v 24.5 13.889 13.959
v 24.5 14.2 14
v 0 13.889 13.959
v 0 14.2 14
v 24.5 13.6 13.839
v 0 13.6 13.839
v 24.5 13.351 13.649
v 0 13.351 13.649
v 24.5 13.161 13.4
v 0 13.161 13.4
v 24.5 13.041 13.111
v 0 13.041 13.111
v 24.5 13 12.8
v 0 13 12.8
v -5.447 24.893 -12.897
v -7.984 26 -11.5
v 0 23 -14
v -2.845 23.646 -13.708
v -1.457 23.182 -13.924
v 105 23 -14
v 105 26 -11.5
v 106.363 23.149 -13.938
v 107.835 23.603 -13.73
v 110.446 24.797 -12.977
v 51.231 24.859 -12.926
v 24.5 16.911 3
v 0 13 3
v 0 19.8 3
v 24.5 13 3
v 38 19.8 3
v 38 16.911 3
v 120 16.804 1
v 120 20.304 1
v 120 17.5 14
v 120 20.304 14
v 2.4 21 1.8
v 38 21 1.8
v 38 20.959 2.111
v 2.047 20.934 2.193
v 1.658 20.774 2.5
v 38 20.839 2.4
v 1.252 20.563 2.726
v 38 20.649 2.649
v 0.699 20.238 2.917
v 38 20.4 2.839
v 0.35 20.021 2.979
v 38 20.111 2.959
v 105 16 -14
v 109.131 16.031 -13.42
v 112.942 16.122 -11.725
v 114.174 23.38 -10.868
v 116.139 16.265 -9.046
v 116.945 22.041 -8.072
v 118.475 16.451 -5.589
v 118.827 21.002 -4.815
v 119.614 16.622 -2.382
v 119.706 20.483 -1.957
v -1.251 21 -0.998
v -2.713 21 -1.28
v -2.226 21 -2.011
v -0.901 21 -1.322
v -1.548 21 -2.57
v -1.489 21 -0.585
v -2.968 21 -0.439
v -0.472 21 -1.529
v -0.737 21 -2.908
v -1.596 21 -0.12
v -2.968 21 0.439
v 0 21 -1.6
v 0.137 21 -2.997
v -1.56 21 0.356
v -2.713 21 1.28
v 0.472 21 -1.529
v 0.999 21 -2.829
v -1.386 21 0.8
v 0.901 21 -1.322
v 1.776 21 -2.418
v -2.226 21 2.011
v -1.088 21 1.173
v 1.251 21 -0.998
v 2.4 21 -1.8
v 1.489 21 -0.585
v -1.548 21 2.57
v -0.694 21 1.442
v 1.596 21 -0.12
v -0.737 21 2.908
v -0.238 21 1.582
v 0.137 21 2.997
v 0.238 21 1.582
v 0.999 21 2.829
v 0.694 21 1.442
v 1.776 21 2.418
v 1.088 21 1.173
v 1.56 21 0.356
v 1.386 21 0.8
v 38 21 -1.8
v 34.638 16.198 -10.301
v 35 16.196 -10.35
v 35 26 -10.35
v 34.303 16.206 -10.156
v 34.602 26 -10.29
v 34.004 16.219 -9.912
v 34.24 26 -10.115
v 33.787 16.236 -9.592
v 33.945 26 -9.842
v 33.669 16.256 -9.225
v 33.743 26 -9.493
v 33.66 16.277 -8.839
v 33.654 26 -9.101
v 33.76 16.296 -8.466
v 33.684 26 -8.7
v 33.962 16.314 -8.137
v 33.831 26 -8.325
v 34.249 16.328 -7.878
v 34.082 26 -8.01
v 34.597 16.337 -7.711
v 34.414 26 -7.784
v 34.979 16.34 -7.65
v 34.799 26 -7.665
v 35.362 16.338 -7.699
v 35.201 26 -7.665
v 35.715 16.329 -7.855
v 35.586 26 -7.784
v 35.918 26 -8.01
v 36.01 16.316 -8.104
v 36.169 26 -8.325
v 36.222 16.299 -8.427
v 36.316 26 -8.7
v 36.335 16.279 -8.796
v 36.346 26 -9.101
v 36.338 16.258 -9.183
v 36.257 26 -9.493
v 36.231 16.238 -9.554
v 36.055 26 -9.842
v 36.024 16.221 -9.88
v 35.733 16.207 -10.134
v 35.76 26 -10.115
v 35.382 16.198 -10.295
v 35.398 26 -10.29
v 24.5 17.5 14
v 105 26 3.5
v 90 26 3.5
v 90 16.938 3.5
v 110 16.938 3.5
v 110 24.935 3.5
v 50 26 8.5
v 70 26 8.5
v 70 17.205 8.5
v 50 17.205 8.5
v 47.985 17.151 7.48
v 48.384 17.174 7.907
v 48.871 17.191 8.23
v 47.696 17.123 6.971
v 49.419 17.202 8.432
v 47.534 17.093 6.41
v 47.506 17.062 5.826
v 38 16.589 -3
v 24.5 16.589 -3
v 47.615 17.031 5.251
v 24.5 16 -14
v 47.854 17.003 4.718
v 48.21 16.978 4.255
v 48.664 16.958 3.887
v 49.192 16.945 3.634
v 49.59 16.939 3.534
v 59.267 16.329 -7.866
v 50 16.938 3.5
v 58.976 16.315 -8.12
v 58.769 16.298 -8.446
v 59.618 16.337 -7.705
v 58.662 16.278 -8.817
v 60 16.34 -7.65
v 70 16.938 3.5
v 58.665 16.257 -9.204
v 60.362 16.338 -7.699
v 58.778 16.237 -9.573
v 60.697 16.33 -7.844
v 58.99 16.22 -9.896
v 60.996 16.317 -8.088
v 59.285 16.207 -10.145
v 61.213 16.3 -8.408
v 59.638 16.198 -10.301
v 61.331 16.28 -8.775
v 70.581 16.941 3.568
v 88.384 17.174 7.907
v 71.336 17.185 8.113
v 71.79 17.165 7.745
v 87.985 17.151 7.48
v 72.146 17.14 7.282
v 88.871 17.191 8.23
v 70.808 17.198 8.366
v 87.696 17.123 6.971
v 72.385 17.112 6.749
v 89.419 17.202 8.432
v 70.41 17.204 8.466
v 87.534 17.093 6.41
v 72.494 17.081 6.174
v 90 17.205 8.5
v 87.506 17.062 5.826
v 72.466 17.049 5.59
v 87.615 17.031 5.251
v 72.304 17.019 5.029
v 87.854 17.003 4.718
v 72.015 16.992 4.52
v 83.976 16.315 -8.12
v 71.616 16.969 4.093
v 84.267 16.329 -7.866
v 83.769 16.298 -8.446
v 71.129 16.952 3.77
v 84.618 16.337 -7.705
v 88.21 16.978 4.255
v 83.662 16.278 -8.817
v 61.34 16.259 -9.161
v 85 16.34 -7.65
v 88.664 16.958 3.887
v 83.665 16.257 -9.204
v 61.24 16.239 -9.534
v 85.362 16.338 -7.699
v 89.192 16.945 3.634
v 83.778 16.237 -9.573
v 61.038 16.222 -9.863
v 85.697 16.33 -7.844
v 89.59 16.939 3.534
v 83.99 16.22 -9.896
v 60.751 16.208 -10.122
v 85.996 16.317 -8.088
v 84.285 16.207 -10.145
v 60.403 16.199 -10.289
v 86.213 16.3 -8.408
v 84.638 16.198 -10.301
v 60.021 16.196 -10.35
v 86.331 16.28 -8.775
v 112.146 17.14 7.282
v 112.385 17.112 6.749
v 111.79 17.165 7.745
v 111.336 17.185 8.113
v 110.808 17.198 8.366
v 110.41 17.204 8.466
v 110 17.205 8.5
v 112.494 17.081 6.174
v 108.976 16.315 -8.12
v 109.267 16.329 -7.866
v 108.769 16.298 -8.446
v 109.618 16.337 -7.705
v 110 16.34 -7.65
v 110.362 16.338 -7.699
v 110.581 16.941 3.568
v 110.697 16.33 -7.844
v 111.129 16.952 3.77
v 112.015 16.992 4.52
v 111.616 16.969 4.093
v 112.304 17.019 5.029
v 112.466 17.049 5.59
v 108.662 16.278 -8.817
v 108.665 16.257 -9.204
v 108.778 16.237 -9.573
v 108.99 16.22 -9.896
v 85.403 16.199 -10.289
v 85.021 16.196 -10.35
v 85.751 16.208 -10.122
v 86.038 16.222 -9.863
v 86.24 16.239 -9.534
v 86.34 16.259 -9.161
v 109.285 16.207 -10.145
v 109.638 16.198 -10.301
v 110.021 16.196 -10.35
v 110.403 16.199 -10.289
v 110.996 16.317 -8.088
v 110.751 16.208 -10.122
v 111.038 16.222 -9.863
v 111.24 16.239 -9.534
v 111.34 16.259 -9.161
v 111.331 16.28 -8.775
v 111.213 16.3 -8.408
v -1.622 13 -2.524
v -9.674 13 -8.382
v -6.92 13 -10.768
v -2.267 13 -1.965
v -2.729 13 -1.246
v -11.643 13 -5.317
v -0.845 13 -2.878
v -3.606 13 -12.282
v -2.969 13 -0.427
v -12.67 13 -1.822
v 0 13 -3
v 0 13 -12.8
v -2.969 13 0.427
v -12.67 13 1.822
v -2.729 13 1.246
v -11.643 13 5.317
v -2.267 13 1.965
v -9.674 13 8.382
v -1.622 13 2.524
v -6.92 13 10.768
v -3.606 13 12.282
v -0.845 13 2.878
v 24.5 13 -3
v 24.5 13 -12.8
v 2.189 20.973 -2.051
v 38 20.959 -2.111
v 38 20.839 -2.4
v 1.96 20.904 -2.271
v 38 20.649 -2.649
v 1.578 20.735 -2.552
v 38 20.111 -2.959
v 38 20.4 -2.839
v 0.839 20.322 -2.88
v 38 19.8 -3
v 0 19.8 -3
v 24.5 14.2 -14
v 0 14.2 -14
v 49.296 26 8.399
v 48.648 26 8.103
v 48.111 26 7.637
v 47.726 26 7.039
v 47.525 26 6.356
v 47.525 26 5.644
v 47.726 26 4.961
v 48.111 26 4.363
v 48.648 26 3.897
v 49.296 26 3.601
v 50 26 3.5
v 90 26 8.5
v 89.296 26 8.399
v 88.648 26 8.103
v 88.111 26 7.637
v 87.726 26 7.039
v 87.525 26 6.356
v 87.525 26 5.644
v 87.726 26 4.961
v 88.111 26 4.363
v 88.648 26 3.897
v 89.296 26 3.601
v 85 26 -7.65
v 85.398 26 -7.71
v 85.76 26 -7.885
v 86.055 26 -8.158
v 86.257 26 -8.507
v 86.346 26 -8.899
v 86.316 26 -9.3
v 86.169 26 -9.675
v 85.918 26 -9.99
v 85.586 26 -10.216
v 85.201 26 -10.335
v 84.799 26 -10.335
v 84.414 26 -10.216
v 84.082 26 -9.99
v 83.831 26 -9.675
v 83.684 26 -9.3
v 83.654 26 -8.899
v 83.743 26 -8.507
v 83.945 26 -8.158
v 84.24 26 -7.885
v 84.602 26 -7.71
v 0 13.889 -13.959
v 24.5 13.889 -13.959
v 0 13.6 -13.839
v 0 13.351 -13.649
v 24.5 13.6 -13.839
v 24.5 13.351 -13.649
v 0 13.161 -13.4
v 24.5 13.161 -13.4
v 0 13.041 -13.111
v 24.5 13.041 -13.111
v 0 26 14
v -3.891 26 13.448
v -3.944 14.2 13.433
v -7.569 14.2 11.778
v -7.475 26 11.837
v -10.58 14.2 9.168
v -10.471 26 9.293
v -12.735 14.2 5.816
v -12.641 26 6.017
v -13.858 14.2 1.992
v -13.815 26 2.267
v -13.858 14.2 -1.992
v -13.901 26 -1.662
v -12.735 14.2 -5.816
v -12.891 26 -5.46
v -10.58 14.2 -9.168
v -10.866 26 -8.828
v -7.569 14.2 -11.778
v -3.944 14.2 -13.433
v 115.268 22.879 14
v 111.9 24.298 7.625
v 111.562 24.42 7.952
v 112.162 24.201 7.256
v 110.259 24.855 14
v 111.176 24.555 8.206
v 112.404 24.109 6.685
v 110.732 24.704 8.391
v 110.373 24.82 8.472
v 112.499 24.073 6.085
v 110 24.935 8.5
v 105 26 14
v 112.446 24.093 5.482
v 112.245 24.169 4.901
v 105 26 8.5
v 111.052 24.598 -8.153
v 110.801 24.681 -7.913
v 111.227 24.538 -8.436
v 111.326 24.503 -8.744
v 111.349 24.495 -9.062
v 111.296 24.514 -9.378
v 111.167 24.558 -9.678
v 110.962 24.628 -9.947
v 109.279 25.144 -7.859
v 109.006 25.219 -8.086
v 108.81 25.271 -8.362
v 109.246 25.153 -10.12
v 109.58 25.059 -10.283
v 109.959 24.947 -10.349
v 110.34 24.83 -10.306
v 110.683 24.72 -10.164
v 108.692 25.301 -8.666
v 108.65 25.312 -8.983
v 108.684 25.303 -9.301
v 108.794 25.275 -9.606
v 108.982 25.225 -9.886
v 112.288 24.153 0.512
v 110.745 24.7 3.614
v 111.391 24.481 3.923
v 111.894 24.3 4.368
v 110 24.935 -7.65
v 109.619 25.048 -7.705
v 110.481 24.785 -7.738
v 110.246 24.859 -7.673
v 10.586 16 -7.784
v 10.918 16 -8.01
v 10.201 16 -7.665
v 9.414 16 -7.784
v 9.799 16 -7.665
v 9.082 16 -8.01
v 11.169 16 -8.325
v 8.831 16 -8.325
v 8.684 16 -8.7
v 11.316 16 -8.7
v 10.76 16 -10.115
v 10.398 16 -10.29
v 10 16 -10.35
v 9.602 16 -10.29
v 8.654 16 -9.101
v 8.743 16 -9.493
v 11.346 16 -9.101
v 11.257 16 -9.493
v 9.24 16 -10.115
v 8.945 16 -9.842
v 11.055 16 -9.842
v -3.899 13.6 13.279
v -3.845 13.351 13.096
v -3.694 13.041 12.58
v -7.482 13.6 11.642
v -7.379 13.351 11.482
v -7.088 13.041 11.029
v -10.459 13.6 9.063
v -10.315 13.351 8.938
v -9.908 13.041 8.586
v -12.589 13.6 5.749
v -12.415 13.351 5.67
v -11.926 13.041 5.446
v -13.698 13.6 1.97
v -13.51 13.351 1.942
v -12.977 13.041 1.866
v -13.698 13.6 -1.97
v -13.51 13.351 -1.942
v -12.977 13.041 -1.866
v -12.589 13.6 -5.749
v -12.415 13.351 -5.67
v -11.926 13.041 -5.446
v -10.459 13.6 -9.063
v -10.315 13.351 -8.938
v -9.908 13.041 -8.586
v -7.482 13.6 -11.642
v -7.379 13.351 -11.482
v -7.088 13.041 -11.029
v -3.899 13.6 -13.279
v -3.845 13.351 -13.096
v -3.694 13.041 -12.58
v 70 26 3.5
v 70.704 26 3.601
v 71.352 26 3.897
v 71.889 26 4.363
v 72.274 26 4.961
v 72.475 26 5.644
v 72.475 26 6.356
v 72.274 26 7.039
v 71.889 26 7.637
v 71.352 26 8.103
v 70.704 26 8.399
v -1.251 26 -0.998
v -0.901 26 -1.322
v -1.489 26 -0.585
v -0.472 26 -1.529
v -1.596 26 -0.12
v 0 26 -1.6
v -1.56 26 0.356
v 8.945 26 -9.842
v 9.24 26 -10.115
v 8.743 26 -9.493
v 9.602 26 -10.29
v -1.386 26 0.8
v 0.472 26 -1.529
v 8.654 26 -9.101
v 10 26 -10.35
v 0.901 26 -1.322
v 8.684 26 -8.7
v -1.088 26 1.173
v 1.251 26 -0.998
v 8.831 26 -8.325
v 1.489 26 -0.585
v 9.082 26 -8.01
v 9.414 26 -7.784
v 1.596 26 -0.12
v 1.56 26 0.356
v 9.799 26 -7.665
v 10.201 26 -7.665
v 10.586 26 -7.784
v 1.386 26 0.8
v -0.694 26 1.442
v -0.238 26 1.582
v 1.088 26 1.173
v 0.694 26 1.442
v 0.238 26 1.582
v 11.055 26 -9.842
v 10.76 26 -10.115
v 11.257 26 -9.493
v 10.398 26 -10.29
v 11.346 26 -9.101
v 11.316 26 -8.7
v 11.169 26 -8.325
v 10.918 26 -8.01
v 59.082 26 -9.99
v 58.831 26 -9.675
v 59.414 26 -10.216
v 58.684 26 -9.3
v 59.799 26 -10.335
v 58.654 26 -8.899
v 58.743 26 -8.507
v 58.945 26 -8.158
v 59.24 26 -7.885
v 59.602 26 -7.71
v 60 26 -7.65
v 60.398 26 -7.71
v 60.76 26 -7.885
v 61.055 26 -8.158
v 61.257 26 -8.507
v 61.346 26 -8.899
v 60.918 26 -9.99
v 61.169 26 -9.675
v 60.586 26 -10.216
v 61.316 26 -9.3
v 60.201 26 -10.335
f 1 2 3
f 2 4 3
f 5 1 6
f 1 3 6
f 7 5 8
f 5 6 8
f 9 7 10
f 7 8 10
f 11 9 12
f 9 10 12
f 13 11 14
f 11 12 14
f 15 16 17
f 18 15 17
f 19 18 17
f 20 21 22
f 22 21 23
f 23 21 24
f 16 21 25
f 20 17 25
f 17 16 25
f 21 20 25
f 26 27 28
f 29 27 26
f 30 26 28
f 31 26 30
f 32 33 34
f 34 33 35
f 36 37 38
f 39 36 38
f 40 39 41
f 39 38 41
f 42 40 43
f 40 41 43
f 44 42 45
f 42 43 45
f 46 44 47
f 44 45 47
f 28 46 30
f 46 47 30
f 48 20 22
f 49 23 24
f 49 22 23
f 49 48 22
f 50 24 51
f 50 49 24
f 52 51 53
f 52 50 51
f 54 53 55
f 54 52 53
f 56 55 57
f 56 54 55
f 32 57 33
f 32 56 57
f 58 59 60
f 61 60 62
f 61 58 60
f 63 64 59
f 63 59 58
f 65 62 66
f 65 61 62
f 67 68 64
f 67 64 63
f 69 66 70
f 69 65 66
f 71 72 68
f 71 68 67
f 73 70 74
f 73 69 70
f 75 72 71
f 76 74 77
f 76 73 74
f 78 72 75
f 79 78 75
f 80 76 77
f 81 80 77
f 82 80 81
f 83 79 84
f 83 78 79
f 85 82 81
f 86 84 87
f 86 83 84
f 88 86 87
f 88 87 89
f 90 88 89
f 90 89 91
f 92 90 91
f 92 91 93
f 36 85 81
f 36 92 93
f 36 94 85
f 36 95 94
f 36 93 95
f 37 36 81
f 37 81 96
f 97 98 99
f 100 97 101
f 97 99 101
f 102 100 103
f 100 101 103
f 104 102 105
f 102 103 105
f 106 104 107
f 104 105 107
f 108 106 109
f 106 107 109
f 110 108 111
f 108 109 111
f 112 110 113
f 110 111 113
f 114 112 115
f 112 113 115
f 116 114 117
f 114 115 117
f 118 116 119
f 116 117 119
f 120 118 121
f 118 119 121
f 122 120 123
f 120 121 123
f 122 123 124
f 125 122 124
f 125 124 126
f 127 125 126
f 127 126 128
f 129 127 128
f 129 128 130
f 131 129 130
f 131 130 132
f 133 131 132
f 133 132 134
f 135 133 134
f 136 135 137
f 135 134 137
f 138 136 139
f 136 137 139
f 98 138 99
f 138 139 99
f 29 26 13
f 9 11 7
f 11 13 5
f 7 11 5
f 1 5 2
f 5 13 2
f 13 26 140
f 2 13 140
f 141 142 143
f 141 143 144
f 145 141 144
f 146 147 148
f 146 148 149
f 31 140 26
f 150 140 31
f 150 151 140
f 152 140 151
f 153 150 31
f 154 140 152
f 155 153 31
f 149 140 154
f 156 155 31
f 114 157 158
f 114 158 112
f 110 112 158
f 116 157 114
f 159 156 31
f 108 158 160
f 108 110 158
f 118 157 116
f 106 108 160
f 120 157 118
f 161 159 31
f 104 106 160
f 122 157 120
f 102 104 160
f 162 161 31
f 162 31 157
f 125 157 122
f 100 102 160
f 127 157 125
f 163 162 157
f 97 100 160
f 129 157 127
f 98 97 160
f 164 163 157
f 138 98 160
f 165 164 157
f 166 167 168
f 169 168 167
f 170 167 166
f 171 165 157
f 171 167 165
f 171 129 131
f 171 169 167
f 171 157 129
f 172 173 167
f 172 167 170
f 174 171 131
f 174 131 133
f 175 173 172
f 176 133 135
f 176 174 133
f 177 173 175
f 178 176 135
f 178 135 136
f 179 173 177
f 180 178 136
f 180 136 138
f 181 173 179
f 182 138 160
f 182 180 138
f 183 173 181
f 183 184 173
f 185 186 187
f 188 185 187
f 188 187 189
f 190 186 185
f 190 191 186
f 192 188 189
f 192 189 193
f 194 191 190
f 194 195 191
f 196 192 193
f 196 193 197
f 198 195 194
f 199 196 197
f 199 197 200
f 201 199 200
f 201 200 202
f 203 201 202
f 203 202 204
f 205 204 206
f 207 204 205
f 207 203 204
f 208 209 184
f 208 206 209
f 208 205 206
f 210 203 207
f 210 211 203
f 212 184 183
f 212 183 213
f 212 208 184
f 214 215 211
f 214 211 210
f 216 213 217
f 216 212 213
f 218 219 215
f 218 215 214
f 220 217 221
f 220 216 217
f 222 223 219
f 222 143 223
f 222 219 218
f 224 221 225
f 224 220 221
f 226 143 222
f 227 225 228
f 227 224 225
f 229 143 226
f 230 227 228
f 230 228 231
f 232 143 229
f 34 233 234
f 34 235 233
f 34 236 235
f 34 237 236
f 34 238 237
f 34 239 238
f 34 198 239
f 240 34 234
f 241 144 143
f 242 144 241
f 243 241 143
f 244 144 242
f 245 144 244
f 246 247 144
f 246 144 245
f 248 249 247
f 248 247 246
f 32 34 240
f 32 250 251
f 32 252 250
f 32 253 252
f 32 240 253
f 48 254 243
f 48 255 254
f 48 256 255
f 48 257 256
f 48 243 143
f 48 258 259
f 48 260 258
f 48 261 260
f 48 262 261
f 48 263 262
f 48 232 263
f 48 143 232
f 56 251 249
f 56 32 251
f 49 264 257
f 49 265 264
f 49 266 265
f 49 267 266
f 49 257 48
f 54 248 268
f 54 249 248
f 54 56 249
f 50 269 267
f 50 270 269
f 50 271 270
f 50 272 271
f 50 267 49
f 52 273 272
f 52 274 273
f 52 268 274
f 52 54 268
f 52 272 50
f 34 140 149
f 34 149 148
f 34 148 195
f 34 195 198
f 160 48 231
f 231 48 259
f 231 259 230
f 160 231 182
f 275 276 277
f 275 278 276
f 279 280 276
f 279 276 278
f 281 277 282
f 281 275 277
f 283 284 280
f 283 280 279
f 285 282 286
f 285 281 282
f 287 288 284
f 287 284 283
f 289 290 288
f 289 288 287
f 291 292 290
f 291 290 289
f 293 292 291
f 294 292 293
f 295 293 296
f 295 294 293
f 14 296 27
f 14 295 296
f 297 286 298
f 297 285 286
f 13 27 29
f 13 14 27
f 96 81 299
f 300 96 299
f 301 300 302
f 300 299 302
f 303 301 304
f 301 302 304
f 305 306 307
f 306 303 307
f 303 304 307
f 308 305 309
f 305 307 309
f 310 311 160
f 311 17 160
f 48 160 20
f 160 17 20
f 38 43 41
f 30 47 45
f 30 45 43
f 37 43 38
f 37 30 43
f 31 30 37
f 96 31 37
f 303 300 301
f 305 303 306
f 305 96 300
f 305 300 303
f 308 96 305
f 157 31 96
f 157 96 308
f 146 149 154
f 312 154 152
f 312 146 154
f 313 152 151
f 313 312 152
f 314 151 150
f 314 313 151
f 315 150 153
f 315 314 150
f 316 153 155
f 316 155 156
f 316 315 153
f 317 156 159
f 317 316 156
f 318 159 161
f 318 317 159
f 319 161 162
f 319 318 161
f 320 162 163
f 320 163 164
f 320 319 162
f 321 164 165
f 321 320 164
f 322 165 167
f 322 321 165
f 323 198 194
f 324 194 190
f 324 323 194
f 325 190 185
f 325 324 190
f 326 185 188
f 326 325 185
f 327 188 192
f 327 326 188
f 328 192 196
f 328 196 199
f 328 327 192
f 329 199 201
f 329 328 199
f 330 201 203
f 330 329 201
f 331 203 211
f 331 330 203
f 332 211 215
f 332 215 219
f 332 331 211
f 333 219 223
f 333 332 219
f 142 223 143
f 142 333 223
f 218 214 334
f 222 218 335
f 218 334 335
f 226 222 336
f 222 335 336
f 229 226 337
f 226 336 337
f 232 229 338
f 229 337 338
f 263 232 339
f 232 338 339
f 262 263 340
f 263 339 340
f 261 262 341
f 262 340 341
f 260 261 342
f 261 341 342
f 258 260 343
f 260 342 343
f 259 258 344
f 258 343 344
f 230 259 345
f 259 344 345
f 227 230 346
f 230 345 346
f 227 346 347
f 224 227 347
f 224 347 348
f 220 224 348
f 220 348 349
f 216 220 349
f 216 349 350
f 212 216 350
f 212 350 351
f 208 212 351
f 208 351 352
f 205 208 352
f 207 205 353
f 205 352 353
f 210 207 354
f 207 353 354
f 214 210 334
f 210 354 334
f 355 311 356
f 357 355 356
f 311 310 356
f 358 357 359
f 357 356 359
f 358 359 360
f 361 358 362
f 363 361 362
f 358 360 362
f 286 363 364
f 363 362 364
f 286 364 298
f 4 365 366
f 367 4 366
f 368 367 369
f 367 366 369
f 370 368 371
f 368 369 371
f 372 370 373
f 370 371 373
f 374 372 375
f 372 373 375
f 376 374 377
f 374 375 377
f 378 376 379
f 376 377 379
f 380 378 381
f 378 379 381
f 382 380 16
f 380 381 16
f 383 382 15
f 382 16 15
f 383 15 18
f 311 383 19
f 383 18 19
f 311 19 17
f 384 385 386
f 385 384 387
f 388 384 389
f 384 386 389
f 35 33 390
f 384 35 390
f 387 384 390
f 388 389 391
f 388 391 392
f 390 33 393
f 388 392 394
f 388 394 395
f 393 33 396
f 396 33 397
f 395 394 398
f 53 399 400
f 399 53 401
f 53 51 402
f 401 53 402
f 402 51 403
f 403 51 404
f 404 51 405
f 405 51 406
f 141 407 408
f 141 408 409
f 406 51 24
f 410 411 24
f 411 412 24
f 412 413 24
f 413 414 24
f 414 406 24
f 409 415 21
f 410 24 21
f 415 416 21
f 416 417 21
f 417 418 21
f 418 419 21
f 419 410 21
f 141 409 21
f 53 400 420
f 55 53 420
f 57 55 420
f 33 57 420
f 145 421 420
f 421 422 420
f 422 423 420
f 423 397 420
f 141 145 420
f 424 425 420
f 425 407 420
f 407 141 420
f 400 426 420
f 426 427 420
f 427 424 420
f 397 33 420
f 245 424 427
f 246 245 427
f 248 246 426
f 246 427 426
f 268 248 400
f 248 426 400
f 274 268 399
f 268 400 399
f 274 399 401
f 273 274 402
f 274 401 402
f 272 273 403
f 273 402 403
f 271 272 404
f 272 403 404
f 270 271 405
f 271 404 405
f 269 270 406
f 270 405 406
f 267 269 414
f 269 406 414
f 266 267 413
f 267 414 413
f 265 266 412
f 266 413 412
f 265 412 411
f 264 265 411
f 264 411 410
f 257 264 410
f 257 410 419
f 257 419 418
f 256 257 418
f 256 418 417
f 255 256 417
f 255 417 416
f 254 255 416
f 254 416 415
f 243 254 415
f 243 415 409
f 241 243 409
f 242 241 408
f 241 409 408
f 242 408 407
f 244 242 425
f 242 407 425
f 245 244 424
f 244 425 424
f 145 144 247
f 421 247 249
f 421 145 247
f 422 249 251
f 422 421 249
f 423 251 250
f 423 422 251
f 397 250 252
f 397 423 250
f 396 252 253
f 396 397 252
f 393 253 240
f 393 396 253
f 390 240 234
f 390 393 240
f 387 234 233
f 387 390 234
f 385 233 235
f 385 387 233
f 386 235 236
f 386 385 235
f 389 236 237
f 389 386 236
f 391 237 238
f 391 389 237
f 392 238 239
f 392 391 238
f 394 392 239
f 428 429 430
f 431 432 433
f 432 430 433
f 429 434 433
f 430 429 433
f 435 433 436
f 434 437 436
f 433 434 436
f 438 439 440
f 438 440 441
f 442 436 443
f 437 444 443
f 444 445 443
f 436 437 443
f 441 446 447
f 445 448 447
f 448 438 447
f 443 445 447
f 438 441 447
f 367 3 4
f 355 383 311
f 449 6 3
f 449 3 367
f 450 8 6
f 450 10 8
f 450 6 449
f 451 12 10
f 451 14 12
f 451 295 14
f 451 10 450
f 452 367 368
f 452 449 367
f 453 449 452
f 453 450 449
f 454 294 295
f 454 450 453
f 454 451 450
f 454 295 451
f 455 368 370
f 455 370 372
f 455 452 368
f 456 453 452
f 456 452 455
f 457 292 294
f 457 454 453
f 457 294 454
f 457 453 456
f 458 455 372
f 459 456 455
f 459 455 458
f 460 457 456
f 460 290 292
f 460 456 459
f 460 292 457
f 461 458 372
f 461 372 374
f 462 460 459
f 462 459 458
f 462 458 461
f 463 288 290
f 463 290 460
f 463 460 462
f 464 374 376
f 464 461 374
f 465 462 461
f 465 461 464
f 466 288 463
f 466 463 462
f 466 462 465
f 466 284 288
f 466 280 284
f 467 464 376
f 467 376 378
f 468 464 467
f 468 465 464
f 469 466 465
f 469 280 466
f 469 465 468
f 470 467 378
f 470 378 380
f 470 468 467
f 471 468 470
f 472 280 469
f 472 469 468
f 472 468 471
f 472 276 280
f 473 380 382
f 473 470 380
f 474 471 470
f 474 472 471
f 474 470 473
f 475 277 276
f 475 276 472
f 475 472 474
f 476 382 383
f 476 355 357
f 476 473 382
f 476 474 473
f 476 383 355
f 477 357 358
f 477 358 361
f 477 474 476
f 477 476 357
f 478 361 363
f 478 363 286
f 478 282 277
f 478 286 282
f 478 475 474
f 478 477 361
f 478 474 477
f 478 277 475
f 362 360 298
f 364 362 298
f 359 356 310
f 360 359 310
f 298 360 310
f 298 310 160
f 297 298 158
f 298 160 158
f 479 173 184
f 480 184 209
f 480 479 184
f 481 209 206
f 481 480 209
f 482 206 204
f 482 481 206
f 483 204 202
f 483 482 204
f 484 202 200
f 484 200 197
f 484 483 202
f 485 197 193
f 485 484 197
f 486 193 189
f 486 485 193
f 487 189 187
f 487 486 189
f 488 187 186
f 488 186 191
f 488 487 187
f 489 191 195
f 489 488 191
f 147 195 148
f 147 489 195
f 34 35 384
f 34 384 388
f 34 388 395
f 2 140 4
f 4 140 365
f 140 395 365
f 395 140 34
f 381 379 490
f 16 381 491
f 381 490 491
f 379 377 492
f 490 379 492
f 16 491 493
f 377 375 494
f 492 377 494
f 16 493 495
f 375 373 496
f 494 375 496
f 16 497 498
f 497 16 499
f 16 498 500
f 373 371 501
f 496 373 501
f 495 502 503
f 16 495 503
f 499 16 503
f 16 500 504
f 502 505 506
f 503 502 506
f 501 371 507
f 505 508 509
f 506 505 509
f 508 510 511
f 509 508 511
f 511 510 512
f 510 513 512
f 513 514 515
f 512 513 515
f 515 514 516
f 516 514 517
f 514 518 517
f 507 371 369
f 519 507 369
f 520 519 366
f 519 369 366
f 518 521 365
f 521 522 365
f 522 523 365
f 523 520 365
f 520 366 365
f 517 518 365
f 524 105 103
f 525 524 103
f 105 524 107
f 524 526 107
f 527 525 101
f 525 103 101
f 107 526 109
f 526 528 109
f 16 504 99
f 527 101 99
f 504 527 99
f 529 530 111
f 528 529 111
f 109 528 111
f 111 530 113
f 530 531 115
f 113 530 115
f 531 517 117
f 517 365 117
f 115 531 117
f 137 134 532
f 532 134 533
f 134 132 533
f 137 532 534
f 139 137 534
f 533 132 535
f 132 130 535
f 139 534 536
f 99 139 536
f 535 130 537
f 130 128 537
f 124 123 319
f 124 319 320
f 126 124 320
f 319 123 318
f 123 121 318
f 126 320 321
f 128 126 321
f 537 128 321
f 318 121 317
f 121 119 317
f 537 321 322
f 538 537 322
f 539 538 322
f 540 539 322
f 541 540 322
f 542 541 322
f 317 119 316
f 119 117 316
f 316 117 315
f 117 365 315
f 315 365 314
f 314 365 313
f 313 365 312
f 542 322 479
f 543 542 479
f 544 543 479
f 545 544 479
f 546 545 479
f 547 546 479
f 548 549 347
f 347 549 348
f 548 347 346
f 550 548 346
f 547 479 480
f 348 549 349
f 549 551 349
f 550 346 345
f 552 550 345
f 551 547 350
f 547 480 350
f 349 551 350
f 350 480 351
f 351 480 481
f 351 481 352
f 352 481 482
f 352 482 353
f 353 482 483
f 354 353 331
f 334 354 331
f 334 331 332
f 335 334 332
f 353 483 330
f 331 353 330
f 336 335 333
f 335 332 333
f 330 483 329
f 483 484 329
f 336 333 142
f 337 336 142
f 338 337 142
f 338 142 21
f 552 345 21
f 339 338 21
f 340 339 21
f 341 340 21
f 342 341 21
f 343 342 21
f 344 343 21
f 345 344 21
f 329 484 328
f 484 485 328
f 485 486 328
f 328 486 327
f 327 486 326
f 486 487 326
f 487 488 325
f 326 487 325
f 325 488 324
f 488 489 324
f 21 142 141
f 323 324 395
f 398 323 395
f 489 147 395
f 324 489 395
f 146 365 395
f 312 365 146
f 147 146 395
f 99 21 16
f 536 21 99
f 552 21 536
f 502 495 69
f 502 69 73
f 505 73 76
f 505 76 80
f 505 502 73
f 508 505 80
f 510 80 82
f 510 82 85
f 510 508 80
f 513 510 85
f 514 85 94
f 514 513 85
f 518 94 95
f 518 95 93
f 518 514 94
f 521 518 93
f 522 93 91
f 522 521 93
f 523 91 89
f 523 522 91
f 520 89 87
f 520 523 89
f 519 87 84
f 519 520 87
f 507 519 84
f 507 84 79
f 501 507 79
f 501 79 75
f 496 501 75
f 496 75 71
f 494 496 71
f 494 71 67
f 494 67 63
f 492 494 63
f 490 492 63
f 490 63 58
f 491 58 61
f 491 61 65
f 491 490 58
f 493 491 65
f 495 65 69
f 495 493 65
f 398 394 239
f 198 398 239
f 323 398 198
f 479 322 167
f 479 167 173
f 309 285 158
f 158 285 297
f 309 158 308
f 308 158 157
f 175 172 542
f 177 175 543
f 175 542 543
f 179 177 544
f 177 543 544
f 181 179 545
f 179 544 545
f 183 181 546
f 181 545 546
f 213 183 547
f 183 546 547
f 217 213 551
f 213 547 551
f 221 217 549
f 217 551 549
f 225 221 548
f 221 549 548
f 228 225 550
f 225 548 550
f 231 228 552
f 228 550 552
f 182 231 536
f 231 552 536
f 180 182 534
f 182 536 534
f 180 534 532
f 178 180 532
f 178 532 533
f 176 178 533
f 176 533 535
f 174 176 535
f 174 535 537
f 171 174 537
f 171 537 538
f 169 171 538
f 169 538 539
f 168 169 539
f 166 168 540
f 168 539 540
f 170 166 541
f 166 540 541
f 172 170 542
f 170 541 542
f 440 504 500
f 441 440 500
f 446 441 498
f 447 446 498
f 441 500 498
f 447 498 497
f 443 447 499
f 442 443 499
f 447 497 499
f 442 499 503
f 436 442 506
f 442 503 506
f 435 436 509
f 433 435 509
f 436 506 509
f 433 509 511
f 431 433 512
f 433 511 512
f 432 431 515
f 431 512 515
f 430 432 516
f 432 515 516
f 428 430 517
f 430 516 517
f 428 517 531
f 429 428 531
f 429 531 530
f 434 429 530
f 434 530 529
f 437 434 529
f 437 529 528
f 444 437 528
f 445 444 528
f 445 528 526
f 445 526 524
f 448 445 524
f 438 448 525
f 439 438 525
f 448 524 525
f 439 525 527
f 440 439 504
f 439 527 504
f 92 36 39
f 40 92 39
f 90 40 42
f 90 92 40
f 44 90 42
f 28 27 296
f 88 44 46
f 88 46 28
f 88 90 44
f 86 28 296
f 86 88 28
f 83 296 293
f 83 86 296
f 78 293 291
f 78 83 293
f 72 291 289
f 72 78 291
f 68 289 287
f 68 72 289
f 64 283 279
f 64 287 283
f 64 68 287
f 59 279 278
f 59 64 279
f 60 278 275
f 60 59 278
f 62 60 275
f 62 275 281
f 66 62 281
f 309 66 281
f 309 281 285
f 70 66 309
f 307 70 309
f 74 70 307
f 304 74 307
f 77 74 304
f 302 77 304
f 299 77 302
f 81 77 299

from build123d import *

# Parameters (mm, degrees)
SKETCH1_R           = 1.35
SKETCH1_R_2         = 3
BOSS_EXTRUDE1_DEPTH = 10
SKETCH9_R           = 3
BOSS_EXTRUDE2_DEPTH = 3
SKETCH10_W          = 38
SKETCH10_H          = 6
CUT_EXTRUDE3_DEPTH  = 8
FILLET3_R           = 15
FILLET4_R           = 1.2
CUT_EXTRUDE4_REACH  = 137.355
CUT_EXTRUDE5_DEPTH  = 56
SKETCH13_R          = 3
SKETCH13_R_2        = 1.6
BOSS_EXTRUDE3_DEPTH = 5
FILLET5_R           = 1.2
CUT_EXTRUDE6_DEPTH  = 160.5
SKETCH15_W          = 146.140561772
SKETCH15_H          = 38.947987949
CUT_EXTRUDE7_DEPTH  = 13


with BuildPart() as part:
    # Sketch1 → Boss-Extrude1 (new body)
    with BuildSketch(Plane(origin=(0, 0, 0), x_dir=(1, 0, 0), z_dir=(0, 1, 0))):
        with BuildLine():
            Line((0, 14), (120, 14))
            Line((120, 14), (120, -14))
            Line((120, -14), (0, -14))
            ThreePointArc((0, -14), (-14, 0), (0, 14))
        make_face()
        with Locations(Location((85, 9, 0), (0, 0, 270))):
            Circle(SKETCH1_R, mode=Mode.SUBTRACT)
        with Locations(Location((60, 9, 0), (0, 0, 270))):
            Circle(SKETCH1_R, mode=Mode.SUBTRACT)
        with Locations(Location((110, 9, 0), (0, 0, 270))):
            Circle(SKETCH1_R, mode=Mode.SUBTRACT)
        with Locations(Location((10, 9, 0), (0, 0, 90))):
            Circle(SKETCH1_R, mode=Mode.SUBTRACT)
        with Locations(Location((35, 9, 0), (0, 0, 90))):
            Circle(SKETCH1_R, mode=Mode.SUBTRACT)
        with Locations(Location((0, 0, 0), (0, 0, 270))):
            Circle(SKETCH1_R_2, mode=Mode.SUBTRACT)
        with BuildLine():
            Line((70, -8.5), (50, -8.5))
            ThreePointArc((50, -8.5), (47.5, -6), (50, -3.5))
            Line((50, -3.5), (70, -3.5))
            ThreePointArc((70, -3.5), (72.5, -6), (70, -8.5))
        make_face(mode=Mode.SUBTRACT)
        with BuildLine():
            Line((90, -3.5), (110, -3.5))
            ThreePointArc((110, -3.5), (112.5, -6), (110, -8.5))
            Line((110, -8.5), (90, -8.5))
            ThreePointArc((90, -8.5), (87.5, -6), (90, -3.5))
        make_face(mode=Mode.SUBTRACT)
    extrude(amount=BOSS_EXTRUDE1_DEPTH)

    # Sketch9 → Boss-Extrude2 (add)
    with BuildSketch(Plane(origin=(0, 10, 0), x_dir=(1, 0, 0), z_dir=(0, 1, 0))):
        with BuildLine():
            Line((0, 14), (24.5, 14))
            Line((24.5, 14), (24.5, -14))
            Line((24.5, -14), (0, -14))
            ThreePointArc((0, -14), (-14, 0), (0, 14))
        make_face()
        with Locations(Location((0, 0, 0), (0, 0, 270))):
            Circle(SKETCH9_R, mode=Mode.SUBTRACT)
    extrude(amount=BOSS_EXTRUDE2_DEPTH)

    # Sketch10 → Cut-Extrude3 (cut)
    with BuildSketch(Plane(origin=(0, 13, 0), x_dir=(1, 0, 0), z_dir=(0, 1, 0))):
        with Locations((19, 0)):
            Rectangle(SKETCH10_W, SKETCH10_H)
    extrude(amount=-CUT_EXTRUDE3_DEPTH, mode=Mode.SUBTRACT)

    # Fillet3
    fillet3_edges = [part.edges().sort_by_distance(p)[0] for p in [
        (120, 5, -14),
    ]]
    fillet(fillet3_edges, radius=FILLET3_R)

    # Fillet4
    # the kernel refuses this fillet: 1.2 mm, written as the material it adds along each edge
    with BuildSketch(Plane(origin=(-3, 5, -3), x_dir=(0, 1, 0), z_dir=(1, 0, 0))) as fillet4_piece_1_section:
        with BuildLine():
            CenterArc((FILLET4_R, FILLET4_R), FILLET4_R, 180, 90)
            Line((0, FILLET4_R), (0, 0))
            Line((0, 0), (FILLET4_R, 0))
        make_face()
    fillet4_piece_1 = extrude(amount=44, mode=Mode.PRIVATE)
    fillet4_piece_1 = fillet4_piece_1 - Plane(origin=(0, 5.276873311, 0), x_dir=(0, 0, 1), z_dir=(0, -1, 0)) * Cylinder(3, 93, mode=Mode.PRIVATE)
    add(fillet4_piece_1)
    with BuildSketch(Plane(origin=(41, 5, 3), x_dir=(0, 1, 0), z_dir=(-1, 0, 0))) as fillet4_piece_2_section:
        with BuildLine():
            CenterArc((FILLET4_R, FILLET4_R), FILLET4_R, 180, 90)
            Line((0, FILLET4_R), (0, 0))
            Line((0, 0), (FILLET4_R, 0))
        make_face()
    fillet4_piece_2 = extrude(amount=44, mode=Mode.PRIVATE)
    fillet4_piece_2 = fillet4_piece_2 - Plane(origin=(0, 5.276873499, 0), x_dir=(0, 0, 1), z_dir=(0, -1, 0)) * Cylinder(3, 93, mode=Mode.PRIVATE)
    add(fillet4_piece_2)

    # Cut-Extrude4: up to this face of the body (flat: up to its plane)
    cut_extrude4_end = Plane(part.part.faces().sort_by_distance((24.5, 11.5, 8.5))[0])
    # Sketch4 → Cut-Extrude4 (cut, up to the picked face)
    with BuildSketch(Plane(origin=(120, 0, 0), x_dir=(0, 0, -1), z_dir=(1, 0, 0)), mode=Mode.PRIVATE) as cut_extrude4_sk1:
        Polygon((-14, 10), (-14, 8.5), (14, 10), align=None)
    cut_extrude4_tool1 = split(extrude(cut_extrude4_sk1.sketch, amount=-CUT_EXTRUDE4_REACH, mode=Mode.PRIVATE), bisect_by=cut_extrude4_end, keep=Keep.BOTH, mode=Mode.PRIVATE)
    add(cut_extrude4_tool1.solids().sort_by(Axis((120, 9.5, 4.666667), (-1, 0, 0)))[0], mode=Mode.SUBTRACT)

    # Sketch11 → Cut-Extrude5 (cut)
    with BuildSketch(Plane(origin=(0, 0, -14), x_dir=(-1, 0, 0), z_dir=(0, 0, -1))):
        with BuildLine():
            add(Edge.make_bspline(
                [(-120, 5.696428571), (-112.075751897, 0.845176506), (-105, 0)],
                knots=[0, 0, 0, 0.27358728, 0.27358728, 0.27358728], degree=2))
            Line((-105, 0), (-120, 0))
            Line((-120, 0), (-120, 5.696428571))
        make_face()
    extrude(amount=-CUT_EXTRUDE5_DEPTH, mode=Mode.SUBTRACT)

    # Sketch13 → Boss-Extrude3 (add)
    with BuildSketch(Plane.XZ):
        Circle(SKETCH13_R)
        with Locations(Location((0, 0, 0), (0, 0, 270))):
            Circle(SKETCH13_R_2, mode=Mode.SUBTRACT)
    extrude(amount=-BOSS_EXTRUDE3_DEPTH)

    # Fillet5
    fillet5_edges = [part.edges().sort_by_distance(p)[0] for p in [
        (-14, 13, 0),
        (12.25, 13, 14),
        (12.25, 13, -14),
    ]]
    fillet(fillet5_edges, radius=FILLET5_R)

    # Sketch14 → Cut-Extrude6 (cut)
    with BuildSketch(Plane(origin=(120, 0, 0), x_dir=(0, 0, -1), z_dir=(1, 0, 0))):
        with BuildLine():
            Line((14, 0), (11.5, 0))
            add(Edge.make_bspline(
                [(11.5, 0), (13.101323316, 0.782640841), (14, 3)],
                knots=[0, 0, 0, 0.269080741, 0.269080741, 0.269080741], degree=2))
            Line((14, 3), (14, 0))
        make_face()
    extrude(amount=-CUT_EXTRUDE6_DEPTH, mode=Mode.SUBTRACT)

    # Mirror1: part across plane


with BuildPart() as part_1:
    add(part.part)
    add(part.part.mirror(Plane.ZX.offset(13)))

    # Sketch15 → Cut-Extrude7 (cut)
    with BuildSketch(Plane.XZ):
        with Locations((46.929719114, -5.473993975)):
            Rectangle(SKETCH15_W, SKETCH15_H)
    extrude(amount=-CUT_EXTRUDE7_DEPTH, mode=Mode.SUBTRACT)


solid = part_1.part
